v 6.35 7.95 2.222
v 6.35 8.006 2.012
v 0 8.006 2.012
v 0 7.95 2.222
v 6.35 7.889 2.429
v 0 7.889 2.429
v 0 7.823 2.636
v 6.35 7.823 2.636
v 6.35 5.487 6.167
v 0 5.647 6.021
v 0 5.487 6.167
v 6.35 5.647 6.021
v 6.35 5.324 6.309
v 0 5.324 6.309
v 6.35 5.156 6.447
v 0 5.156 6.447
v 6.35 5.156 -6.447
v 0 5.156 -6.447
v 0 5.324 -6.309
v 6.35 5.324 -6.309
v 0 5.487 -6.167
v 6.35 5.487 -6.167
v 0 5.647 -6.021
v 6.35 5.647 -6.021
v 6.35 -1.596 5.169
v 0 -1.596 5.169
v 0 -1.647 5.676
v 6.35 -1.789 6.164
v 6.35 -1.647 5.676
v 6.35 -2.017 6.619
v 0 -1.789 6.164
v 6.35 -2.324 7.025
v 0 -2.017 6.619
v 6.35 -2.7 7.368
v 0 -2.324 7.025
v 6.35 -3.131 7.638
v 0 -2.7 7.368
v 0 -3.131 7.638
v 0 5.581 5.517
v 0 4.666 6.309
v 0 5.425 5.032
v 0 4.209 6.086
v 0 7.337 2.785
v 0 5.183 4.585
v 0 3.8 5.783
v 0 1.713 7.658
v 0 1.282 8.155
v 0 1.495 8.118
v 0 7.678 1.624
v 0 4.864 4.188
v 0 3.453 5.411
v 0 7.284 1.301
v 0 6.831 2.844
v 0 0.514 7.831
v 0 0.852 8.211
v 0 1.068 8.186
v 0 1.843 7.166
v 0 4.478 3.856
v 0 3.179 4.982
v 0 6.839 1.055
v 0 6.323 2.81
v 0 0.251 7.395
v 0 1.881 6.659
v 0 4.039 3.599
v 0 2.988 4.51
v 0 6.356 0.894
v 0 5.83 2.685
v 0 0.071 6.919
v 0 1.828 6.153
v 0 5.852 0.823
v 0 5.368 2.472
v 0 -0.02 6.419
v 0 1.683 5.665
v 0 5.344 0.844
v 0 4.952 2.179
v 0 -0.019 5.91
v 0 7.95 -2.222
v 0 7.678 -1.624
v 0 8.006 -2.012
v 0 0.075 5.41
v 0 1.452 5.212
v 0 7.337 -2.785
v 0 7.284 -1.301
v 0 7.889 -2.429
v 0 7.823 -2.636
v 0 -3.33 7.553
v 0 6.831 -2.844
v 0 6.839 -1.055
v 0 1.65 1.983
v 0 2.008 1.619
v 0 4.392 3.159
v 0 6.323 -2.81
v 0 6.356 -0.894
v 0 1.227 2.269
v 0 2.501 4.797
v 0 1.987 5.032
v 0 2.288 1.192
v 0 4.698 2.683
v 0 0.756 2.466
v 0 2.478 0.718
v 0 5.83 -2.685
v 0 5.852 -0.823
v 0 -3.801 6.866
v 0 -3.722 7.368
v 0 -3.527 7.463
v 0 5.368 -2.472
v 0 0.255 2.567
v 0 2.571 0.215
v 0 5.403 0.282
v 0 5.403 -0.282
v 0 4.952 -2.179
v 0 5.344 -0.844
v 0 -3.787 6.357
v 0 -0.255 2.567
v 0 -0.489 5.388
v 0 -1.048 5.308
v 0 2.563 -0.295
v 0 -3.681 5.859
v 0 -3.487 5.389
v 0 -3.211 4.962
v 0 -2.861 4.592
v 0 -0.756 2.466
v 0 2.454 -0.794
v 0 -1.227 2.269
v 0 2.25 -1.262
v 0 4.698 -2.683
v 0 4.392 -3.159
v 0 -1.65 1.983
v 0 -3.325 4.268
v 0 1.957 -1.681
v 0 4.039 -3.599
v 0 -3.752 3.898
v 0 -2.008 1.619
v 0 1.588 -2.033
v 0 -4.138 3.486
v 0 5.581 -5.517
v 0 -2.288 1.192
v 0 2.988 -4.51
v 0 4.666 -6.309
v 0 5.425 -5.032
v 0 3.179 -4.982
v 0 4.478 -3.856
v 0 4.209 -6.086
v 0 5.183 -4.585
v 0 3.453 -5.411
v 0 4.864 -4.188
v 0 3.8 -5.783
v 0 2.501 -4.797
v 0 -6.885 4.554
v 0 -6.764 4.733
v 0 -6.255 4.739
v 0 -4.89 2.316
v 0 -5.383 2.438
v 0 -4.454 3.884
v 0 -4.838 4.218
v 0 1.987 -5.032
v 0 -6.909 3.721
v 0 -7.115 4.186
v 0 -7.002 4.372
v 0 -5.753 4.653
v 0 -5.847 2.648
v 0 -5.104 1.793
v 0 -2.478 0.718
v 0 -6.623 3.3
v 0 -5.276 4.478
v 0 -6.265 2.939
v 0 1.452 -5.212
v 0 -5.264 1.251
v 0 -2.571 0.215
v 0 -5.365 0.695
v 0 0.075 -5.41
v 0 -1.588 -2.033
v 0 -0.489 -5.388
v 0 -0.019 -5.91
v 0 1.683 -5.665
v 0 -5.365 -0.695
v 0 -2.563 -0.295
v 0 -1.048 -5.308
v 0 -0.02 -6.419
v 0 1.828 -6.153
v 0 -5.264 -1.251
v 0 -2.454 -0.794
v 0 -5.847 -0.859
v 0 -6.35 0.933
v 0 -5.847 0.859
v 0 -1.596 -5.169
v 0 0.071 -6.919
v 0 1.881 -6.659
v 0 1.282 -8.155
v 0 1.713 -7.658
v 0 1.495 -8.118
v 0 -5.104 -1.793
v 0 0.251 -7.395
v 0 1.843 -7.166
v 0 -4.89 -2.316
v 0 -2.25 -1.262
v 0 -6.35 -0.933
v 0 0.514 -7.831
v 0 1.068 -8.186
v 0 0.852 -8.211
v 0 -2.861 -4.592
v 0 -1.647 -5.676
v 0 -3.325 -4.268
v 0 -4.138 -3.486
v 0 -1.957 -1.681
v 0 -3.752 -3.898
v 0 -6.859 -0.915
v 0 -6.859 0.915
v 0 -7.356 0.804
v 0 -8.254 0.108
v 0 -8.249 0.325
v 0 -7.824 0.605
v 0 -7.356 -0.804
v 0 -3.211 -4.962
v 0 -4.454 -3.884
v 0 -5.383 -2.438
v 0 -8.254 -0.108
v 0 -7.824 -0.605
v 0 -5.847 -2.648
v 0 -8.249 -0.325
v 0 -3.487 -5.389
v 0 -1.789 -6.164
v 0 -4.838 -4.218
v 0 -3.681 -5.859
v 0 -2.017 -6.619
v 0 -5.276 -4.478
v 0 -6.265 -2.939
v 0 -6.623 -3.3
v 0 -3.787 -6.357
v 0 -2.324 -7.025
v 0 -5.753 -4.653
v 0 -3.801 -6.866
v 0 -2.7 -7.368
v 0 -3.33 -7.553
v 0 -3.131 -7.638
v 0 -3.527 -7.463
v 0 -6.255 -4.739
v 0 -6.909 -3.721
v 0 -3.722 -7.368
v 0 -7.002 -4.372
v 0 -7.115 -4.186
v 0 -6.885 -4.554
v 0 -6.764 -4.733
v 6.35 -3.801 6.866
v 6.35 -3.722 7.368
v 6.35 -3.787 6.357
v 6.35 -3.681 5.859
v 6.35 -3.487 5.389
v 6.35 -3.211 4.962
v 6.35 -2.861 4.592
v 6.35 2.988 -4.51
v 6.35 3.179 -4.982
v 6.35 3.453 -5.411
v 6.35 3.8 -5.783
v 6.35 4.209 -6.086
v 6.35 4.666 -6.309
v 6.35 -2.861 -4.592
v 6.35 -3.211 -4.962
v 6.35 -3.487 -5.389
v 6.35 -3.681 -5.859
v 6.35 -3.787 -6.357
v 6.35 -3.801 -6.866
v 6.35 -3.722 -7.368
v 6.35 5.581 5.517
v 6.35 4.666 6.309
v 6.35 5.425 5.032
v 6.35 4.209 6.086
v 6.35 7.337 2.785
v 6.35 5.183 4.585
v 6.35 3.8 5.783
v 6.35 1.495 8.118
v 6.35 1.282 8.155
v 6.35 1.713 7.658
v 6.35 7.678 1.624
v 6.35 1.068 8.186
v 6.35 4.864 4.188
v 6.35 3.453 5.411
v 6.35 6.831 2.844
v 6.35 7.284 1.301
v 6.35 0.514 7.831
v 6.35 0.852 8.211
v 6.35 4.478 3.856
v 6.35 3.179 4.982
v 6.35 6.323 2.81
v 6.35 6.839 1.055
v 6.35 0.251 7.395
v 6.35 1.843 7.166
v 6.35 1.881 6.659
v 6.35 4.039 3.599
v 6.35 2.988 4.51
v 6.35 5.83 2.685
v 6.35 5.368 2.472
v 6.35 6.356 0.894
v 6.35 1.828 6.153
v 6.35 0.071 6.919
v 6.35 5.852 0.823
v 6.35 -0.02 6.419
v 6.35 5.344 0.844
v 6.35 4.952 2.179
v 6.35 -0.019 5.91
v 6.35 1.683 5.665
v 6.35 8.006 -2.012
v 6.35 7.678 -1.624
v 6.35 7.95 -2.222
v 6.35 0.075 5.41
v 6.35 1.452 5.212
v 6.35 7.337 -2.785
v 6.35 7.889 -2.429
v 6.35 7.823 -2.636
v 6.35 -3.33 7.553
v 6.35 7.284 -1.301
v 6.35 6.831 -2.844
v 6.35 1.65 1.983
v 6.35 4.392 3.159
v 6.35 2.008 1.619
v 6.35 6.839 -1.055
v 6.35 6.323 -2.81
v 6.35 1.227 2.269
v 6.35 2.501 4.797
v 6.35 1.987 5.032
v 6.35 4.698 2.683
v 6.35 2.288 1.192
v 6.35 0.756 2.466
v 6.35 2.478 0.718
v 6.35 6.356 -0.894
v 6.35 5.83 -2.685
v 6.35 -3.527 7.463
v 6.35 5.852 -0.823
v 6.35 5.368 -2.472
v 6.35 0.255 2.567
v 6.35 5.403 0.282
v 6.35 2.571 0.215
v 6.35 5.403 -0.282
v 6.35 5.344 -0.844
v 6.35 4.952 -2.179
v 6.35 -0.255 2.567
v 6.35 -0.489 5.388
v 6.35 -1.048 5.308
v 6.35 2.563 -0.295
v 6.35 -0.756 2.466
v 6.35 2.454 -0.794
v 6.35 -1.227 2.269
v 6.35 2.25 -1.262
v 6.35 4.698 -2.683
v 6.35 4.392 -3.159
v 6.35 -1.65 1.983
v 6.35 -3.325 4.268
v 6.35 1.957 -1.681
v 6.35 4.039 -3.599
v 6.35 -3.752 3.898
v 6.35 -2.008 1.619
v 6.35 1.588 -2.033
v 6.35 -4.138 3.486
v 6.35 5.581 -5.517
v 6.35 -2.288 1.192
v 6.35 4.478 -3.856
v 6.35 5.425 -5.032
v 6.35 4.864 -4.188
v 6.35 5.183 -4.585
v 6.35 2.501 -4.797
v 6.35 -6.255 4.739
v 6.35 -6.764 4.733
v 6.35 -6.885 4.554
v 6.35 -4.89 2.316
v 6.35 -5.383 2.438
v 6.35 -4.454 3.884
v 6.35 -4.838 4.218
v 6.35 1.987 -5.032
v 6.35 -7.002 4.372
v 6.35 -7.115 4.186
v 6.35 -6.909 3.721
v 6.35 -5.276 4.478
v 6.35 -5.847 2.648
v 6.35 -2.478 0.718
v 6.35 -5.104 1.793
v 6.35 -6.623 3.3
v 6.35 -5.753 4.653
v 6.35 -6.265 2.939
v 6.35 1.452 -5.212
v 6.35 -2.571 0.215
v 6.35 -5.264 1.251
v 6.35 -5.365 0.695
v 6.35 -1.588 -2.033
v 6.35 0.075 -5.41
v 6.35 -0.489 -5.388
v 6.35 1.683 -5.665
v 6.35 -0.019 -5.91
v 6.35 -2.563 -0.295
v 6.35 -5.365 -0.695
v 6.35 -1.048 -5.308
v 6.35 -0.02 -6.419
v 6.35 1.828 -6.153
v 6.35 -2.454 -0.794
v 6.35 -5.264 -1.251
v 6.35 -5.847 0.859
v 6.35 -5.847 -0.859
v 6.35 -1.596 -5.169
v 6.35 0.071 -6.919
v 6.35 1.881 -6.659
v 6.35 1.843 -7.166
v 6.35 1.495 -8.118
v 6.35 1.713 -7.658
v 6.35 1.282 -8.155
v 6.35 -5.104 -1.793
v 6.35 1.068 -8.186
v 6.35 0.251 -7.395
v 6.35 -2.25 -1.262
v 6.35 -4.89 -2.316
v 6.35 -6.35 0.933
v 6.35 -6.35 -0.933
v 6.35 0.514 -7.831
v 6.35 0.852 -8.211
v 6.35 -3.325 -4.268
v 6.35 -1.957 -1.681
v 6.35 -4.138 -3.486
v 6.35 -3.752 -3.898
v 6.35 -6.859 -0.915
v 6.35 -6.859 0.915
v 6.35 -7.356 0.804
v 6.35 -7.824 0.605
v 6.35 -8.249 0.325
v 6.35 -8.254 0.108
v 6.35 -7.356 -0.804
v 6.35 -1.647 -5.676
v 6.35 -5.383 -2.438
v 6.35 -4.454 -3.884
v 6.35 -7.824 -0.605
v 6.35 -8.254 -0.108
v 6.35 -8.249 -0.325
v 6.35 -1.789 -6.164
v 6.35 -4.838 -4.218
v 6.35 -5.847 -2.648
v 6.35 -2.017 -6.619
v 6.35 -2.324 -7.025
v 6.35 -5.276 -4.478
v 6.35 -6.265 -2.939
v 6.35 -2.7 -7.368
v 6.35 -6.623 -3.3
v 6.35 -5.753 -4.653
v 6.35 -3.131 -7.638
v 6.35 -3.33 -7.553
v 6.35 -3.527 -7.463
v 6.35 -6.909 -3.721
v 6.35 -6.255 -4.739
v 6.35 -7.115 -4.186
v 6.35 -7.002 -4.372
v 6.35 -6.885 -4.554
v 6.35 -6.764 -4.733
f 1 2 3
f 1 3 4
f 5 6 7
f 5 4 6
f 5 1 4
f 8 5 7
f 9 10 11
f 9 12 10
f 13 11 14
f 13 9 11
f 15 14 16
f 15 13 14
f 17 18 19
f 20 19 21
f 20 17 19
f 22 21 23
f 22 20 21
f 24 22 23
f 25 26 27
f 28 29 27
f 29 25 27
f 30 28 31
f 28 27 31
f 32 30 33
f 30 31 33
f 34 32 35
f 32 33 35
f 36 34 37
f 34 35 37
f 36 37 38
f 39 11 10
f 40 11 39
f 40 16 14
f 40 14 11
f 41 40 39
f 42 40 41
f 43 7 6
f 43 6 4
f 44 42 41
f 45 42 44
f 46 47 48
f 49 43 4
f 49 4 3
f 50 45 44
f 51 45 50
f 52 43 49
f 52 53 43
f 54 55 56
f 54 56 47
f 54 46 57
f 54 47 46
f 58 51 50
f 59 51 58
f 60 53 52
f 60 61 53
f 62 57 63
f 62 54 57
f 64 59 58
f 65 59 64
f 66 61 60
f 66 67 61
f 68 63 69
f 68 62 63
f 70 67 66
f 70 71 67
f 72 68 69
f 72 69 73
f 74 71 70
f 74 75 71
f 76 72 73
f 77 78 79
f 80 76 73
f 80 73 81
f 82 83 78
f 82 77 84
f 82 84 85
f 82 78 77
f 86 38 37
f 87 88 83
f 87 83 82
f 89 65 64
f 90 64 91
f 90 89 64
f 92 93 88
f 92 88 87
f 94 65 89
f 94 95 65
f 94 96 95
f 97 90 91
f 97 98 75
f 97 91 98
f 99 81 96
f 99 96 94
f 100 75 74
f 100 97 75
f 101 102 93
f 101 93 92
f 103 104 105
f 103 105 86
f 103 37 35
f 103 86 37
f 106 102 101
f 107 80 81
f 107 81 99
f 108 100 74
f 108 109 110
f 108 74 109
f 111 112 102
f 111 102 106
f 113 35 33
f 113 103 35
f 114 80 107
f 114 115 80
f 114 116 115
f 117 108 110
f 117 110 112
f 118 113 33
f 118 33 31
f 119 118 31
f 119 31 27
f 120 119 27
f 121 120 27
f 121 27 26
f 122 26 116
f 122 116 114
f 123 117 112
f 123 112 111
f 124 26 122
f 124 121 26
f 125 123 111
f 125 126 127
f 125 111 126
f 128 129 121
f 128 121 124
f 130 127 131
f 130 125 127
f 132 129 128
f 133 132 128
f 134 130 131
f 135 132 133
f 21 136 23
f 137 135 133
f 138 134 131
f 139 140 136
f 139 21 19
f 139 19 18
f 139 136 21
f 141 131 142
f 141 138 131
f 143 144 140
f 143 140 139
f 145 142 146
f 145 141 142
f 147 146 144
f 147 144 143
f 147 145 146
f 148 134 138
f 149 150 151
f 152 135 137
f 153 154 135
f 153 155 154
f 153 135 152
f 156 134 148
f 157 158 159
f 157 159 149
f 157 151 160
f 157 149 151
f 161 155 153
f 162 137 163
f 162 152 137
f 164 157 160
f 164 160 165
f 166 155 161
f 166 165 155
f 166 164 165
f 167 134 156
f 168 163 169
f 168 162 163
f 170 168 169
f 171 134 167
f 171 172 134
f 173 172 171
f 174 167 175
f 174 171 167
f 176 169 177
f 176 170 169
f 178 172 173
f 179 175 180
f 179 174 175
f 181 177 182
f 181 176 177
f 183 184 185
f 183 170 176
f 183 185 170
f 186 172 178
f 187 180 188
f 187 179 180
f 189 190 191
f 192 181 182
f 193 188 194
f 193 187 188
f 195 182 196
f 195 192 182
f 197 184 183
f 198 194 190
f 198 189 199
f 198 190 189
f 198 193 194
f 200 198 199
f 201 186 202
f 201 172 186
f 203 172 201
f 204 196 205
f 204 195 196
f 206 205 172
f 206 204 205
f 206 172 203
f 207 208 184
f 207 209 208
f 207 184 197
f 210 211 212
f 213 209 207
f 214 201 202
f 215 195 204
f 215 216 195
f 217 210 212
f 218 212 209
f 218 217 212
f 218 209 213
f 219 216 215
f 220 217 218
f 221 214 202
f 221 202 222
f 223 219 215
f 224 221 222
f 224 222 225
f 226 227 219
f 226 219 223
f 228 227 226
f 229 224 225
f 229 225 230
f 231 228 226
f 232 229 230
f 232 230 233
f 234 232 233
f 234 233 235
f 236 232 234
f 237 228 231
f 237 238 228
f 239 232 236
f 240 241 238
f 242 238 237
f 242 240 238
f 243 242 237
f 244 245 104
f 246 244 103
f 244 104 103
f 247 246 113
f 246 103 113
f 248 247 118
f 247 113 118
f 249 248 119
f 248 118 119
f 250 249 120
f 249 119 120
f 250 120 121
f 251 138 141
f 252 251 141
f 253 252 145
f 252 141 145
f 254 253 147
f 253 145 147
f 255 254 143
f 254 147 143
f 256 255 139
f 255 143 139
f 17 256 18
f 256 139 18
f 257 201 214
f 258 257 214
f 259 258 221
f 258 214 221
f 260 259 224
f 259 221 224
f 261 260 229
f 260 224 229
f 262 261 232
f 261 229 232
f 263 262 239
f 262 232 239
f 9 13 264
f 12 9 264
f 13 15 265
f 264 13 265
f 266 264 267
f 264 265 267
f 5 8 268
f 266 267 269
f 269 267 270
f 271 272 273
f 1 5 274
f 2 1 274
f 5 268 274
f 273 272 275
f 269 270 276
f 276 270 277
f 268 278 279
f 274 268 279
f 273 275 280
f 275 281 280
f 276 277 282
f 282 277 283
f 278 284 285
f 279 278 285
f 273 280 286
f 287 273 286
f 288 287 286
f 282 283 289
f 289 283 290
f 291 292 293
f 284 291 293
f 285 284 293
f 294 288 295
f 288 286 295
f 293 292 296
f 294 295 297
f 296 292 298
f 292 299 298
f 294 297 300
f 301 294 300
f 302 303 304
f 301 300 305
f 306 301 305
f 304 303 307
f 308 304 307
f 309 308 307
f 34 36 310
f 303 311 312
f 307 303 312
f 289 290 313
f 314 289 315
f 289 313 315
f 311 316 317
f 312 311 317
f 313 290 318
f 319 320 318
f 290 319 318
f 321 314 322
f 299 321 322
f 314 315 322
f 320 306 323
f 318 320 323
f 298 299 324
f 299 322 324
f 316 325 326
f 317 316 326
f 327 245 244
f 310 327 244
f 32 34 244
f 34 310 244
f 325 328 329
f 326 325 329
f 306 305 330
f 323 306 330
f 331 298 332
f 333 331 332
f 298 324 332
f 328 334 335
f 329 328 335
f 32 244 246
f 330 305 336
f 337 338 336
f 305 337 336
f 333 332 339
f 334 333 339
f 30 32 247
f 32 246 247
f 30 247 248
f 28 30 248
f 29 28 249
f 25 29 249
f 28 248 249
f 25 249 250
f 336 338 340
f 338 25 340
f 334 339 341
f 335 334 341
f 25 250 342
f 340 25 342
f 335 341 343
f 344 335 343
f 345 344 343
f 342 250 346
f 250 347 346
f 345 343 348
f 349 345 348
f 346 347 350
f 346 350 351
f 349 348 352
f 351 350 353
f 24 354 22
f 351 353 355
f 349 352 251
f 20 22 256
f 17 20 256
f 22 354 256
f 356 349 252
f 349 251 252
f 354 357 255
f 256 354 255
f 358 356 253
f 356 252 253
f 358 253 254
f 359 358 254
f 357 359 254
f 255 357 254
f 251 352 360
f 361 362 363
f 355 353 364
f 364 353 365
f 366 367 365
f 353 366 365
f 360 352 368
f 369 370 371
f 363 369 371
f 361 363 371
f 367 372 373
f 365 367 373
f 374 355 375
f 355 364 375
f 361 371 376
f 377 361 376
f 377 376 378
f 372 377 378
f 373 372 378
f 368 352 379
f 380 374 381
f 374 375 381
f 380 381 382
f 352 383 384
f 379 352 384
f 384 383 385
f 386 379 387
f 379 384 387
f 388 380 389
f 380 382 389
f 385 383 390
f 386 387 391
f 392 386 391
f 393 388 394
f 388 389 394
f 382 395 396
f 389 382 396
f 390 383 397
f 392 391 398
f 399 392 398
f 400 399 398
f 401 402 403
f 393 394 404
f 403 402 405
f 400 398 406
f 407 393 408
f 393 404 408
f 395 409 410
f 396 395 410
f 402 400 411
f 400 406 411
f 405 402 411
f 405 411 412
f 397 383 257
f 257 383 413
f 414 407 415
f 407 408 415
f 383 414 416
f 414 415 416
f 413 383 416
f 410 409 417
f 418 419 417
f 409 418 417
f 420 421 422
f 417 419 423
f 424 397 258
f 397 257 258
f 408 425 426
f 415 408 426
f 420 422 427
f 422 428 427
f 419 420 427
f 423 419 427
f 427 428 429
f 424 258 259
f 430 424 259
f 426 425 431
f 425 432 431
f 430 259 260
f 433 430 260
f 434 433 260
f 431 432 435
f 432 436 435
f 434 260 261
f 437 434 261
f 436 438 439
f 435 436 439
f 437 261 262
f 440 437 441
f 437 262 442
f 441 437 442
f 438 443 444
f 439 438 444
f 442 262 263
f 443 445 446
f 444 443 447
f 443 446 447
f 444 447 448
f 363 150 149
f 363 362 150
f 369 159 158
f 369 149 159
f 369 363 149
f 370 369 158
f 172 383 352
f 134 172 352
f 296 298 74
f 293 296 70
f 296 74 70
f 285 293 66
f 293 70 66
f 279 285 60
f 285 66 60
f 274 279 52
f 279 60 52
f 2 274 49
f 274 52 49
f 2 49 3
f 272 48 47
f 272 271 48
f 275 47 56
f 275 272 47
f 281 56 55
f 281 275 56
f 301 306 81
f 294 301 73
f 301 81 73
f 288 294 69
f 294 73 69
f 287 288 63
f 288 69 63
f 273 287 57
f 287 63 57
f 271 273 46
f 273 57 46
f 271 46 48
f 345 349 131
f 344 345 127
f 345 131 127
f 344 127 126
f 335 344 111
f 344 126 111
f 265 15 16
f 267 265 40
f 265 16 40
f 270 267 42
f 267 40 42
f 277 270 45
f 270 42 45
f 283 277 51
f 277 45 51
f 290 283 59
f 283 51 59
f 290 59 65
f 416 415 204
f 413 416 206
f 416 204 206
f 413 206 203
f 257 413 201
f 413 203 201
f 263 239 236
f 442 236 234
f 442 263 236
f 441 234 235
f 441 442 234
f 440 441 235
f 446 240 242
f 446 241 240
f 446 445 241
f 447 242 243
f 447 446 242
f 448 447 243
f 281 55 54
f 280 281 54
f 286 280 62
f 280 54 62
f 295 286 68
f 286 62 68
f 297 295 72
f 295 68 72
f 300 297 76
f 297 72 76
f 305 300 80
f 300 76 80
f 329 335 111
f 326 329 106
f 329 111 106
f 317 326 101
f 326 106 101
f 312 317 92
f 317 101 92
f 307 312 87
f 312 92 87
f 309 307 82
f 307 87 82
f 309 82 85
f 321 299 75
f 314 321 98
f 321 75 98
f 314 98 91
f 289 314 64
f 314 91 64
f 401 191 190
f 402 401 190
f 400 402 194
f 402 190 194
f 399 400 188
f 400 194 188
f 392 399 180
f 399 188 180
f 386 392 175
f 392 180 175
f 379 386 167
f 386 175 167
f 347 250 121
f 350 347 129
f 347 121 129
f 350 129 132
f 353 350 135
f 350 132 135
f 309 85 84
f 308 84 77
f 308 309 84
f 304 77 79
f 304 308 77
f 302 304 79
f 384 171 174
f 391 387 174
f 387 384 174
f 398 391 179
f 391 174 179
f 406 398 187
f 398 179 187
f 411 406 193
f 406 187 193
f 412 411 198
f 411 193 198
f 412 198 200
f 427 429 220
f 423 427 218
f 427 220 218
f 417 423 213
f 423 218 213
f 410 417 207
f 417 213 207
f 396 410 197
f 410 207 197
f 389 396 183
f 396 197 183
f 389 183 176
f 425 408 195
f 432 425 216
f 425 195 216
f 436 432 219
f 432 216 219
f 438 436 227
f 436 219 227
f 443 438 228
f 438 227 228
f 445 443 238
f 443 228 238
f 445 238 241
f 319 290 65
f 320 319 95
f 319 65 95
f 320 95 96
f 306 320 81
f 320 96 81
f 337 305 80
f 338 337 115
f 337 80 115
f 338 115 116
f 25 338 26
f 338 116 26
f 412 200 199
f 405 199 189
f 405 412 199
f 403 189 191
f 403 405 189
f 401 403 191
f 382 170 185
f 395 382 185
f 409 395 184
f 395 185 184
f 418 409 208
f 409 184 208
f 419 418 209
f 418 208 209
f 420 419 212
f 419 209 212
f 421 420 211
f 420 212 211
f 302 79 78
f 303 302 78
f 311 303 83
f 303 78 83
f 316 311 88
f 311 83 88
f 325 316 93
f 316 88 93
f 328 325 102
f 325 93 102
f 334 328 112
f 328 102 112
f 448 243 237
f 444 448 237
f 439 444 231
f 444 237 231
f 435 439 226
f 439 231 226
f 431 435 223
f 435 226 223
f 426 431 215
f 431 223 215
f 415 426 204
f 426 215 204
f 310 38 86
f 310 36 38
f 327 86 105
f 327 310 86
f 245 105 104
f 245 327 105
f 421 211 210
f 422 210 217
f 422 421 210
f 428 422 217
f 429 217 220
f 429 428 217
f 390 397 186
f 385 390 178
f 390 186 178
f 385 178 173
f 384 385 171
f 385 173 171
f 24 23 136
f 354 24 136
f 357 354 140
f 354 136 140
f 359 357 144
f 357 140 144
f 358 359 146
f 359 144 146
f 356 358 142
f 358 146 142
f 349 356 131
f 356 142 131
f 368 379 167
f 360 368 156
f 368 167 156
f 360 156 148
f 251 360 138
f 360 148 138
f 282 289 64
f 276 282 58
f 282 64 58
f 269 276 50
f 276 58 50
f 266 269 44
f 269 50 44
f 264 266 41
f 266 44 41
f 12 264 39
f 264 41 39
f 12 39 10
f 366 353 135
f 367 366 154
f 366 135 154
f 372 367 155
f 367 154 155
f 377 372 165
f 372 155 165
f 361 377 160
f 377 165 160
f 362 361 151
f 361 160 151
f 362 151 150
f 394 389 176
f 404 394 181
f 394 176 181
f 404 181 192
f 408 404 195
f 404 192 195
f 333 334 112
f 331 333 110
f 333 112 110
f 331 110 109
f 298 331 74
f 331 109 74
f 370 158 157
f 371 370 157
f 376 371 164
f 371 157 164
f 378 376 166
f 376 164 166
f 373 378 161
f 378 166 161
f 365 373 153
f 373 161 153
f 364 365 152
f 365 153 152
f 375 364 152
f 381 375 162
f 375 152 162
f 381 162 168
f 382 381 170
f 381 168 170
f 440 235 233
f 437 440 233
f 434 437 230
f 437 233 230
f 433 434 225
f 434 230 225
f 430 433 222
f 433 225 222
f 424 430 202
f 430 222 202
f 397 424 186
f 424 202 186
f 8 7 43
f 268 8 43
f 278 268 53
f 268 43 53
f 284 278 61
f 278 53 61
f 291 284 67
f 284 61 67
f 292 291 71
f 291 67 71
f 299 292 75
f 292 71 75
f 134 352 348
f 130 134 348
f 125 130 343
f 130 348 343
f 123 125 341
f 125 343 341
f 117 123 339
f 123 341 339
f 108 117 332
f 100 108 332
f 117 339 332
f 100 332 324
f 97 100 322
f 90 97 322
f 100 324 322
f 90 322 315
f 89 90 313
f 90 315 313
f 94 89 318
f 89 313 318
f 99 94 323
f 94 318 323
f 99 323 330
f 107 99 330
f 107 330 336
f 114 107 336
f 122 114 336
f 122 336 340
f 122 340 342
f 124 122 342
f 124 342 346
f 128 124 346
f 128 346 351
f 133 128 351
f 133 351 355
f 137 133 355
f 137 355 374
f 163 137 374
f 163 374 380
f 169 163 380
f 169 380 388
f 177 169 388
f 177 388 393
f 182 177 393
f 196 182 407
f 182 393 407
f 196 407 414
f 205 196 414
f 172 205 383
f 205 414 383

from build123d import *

# Parameters (mm, degrees)
BASPROSKE_W        = 6.35
BASPROSKE_H        = 8.255
TOOTHCUT_DEPTH     = 14.289565456
TEETHCUTS_COUNT    = 11
TEETHCUTS_ANGLE    = 327.272727273
BORSKE_R           = 1.5875
BORE_DEPTH         = 50.8000508
SKETCH1_R          = 1.5875
CUT_EXTRUDE1_DEPTH = 14.262197482


with BuildPart() as part:
    # BasProSke → Base-Revolve (revolve)
    with BuildSketch(Plane(origin=(0, 0, 0), x_dir=(1, 0, 0), z_dir=(0, 1, 0)), mode=Mode.PRIVATE) as base_revolve_sk:
        with Locations((3.175, 4.1275)):
            Rectangle(BASPROSKE_W, BASPROSKE_H)
    revolve(base_revolve_sk.sketch.rotate(Axis((-10, 0, 0), (1, 0, 0)), 180), axis=Axis((-10, 0, 0), (1, 0, 0)))

    # TooCutSke → ToothCut (cut, through all)
    with BuildSketch(Plane(origin=(0, 0, 0), x_dir=(0, 0, -1), z_dir=(1, 0, 0))):
        with BuildLine():
            ThreePointArc((0.844285256, 5.34391677), (0, 5.4102), (-0.844285256, 5.34391677))
            ThreePointArc((-0.844285256, 5.34391677), (-1.061642965, 6.854251062), (-2.040080862, 8.025153845))
            ThreePointArc((-2.040080862, 8.025153845), (0, 8.2804), (2.040080862, 8.025153845))
            ThreePointArc((2.040080862, 8.025153845), (1.061642965, 6.854251062), (0.844285256, 5.34391677))
        make_face()
    toothcut = extrude(amount=TOOTHCUT_DEPTH, mode=Mode.SUBTRACT)

    # TeethCuts: ToothCut ×11 about axis
    teethcuts_axis = Axis((-10, 0, 0), (1, 0, 0))
    for i in range(1, TEETHCUTS_COUNT):
        add(toothcut.rotate(teethcuts_axis, i * TEETHCUTS_ANGLE / (TEETHCUTS_COUNT - 1)), mode=Mode.SUBTRACT)

    # BorSke → Bore (cut, symmetric)
    with BuildSketch(Plane(origin=(0, 0, 0), x_dir=(0, 0, -1), z_dir=(1, 0, 0))):
        with Locations(Location((0, 0, 0), (0, 0, 180))):
            Circle(BORSKE_R)
    extrude(amount=BORE_DEPTH, both=True, mode=Mode.SUBTRACT)

    # Sketch1 → Cut-Extrude1 (cut, through all)
    with BuildSketch(Plane(origin=(6.35, 0, 0), x_dir=(0, 0, -1), z_dir=(1, 0, 0))):
        with BuildLine():
            Line((2.033379293, -1.5875), (2.033379293, 1.5875))
            ThreePointArc((2.033379293, 1.5875), (-2.5796875, 0), (2.033379293, -1.5875))
        make_face()
        Circle(SKETCH1_R, mode=Mode.SUBTRACT)
    extrude(amount=-CUT_EXTRUDE1_DEPTH, mode=Mode.SUBTRACT)


solid = part.part
